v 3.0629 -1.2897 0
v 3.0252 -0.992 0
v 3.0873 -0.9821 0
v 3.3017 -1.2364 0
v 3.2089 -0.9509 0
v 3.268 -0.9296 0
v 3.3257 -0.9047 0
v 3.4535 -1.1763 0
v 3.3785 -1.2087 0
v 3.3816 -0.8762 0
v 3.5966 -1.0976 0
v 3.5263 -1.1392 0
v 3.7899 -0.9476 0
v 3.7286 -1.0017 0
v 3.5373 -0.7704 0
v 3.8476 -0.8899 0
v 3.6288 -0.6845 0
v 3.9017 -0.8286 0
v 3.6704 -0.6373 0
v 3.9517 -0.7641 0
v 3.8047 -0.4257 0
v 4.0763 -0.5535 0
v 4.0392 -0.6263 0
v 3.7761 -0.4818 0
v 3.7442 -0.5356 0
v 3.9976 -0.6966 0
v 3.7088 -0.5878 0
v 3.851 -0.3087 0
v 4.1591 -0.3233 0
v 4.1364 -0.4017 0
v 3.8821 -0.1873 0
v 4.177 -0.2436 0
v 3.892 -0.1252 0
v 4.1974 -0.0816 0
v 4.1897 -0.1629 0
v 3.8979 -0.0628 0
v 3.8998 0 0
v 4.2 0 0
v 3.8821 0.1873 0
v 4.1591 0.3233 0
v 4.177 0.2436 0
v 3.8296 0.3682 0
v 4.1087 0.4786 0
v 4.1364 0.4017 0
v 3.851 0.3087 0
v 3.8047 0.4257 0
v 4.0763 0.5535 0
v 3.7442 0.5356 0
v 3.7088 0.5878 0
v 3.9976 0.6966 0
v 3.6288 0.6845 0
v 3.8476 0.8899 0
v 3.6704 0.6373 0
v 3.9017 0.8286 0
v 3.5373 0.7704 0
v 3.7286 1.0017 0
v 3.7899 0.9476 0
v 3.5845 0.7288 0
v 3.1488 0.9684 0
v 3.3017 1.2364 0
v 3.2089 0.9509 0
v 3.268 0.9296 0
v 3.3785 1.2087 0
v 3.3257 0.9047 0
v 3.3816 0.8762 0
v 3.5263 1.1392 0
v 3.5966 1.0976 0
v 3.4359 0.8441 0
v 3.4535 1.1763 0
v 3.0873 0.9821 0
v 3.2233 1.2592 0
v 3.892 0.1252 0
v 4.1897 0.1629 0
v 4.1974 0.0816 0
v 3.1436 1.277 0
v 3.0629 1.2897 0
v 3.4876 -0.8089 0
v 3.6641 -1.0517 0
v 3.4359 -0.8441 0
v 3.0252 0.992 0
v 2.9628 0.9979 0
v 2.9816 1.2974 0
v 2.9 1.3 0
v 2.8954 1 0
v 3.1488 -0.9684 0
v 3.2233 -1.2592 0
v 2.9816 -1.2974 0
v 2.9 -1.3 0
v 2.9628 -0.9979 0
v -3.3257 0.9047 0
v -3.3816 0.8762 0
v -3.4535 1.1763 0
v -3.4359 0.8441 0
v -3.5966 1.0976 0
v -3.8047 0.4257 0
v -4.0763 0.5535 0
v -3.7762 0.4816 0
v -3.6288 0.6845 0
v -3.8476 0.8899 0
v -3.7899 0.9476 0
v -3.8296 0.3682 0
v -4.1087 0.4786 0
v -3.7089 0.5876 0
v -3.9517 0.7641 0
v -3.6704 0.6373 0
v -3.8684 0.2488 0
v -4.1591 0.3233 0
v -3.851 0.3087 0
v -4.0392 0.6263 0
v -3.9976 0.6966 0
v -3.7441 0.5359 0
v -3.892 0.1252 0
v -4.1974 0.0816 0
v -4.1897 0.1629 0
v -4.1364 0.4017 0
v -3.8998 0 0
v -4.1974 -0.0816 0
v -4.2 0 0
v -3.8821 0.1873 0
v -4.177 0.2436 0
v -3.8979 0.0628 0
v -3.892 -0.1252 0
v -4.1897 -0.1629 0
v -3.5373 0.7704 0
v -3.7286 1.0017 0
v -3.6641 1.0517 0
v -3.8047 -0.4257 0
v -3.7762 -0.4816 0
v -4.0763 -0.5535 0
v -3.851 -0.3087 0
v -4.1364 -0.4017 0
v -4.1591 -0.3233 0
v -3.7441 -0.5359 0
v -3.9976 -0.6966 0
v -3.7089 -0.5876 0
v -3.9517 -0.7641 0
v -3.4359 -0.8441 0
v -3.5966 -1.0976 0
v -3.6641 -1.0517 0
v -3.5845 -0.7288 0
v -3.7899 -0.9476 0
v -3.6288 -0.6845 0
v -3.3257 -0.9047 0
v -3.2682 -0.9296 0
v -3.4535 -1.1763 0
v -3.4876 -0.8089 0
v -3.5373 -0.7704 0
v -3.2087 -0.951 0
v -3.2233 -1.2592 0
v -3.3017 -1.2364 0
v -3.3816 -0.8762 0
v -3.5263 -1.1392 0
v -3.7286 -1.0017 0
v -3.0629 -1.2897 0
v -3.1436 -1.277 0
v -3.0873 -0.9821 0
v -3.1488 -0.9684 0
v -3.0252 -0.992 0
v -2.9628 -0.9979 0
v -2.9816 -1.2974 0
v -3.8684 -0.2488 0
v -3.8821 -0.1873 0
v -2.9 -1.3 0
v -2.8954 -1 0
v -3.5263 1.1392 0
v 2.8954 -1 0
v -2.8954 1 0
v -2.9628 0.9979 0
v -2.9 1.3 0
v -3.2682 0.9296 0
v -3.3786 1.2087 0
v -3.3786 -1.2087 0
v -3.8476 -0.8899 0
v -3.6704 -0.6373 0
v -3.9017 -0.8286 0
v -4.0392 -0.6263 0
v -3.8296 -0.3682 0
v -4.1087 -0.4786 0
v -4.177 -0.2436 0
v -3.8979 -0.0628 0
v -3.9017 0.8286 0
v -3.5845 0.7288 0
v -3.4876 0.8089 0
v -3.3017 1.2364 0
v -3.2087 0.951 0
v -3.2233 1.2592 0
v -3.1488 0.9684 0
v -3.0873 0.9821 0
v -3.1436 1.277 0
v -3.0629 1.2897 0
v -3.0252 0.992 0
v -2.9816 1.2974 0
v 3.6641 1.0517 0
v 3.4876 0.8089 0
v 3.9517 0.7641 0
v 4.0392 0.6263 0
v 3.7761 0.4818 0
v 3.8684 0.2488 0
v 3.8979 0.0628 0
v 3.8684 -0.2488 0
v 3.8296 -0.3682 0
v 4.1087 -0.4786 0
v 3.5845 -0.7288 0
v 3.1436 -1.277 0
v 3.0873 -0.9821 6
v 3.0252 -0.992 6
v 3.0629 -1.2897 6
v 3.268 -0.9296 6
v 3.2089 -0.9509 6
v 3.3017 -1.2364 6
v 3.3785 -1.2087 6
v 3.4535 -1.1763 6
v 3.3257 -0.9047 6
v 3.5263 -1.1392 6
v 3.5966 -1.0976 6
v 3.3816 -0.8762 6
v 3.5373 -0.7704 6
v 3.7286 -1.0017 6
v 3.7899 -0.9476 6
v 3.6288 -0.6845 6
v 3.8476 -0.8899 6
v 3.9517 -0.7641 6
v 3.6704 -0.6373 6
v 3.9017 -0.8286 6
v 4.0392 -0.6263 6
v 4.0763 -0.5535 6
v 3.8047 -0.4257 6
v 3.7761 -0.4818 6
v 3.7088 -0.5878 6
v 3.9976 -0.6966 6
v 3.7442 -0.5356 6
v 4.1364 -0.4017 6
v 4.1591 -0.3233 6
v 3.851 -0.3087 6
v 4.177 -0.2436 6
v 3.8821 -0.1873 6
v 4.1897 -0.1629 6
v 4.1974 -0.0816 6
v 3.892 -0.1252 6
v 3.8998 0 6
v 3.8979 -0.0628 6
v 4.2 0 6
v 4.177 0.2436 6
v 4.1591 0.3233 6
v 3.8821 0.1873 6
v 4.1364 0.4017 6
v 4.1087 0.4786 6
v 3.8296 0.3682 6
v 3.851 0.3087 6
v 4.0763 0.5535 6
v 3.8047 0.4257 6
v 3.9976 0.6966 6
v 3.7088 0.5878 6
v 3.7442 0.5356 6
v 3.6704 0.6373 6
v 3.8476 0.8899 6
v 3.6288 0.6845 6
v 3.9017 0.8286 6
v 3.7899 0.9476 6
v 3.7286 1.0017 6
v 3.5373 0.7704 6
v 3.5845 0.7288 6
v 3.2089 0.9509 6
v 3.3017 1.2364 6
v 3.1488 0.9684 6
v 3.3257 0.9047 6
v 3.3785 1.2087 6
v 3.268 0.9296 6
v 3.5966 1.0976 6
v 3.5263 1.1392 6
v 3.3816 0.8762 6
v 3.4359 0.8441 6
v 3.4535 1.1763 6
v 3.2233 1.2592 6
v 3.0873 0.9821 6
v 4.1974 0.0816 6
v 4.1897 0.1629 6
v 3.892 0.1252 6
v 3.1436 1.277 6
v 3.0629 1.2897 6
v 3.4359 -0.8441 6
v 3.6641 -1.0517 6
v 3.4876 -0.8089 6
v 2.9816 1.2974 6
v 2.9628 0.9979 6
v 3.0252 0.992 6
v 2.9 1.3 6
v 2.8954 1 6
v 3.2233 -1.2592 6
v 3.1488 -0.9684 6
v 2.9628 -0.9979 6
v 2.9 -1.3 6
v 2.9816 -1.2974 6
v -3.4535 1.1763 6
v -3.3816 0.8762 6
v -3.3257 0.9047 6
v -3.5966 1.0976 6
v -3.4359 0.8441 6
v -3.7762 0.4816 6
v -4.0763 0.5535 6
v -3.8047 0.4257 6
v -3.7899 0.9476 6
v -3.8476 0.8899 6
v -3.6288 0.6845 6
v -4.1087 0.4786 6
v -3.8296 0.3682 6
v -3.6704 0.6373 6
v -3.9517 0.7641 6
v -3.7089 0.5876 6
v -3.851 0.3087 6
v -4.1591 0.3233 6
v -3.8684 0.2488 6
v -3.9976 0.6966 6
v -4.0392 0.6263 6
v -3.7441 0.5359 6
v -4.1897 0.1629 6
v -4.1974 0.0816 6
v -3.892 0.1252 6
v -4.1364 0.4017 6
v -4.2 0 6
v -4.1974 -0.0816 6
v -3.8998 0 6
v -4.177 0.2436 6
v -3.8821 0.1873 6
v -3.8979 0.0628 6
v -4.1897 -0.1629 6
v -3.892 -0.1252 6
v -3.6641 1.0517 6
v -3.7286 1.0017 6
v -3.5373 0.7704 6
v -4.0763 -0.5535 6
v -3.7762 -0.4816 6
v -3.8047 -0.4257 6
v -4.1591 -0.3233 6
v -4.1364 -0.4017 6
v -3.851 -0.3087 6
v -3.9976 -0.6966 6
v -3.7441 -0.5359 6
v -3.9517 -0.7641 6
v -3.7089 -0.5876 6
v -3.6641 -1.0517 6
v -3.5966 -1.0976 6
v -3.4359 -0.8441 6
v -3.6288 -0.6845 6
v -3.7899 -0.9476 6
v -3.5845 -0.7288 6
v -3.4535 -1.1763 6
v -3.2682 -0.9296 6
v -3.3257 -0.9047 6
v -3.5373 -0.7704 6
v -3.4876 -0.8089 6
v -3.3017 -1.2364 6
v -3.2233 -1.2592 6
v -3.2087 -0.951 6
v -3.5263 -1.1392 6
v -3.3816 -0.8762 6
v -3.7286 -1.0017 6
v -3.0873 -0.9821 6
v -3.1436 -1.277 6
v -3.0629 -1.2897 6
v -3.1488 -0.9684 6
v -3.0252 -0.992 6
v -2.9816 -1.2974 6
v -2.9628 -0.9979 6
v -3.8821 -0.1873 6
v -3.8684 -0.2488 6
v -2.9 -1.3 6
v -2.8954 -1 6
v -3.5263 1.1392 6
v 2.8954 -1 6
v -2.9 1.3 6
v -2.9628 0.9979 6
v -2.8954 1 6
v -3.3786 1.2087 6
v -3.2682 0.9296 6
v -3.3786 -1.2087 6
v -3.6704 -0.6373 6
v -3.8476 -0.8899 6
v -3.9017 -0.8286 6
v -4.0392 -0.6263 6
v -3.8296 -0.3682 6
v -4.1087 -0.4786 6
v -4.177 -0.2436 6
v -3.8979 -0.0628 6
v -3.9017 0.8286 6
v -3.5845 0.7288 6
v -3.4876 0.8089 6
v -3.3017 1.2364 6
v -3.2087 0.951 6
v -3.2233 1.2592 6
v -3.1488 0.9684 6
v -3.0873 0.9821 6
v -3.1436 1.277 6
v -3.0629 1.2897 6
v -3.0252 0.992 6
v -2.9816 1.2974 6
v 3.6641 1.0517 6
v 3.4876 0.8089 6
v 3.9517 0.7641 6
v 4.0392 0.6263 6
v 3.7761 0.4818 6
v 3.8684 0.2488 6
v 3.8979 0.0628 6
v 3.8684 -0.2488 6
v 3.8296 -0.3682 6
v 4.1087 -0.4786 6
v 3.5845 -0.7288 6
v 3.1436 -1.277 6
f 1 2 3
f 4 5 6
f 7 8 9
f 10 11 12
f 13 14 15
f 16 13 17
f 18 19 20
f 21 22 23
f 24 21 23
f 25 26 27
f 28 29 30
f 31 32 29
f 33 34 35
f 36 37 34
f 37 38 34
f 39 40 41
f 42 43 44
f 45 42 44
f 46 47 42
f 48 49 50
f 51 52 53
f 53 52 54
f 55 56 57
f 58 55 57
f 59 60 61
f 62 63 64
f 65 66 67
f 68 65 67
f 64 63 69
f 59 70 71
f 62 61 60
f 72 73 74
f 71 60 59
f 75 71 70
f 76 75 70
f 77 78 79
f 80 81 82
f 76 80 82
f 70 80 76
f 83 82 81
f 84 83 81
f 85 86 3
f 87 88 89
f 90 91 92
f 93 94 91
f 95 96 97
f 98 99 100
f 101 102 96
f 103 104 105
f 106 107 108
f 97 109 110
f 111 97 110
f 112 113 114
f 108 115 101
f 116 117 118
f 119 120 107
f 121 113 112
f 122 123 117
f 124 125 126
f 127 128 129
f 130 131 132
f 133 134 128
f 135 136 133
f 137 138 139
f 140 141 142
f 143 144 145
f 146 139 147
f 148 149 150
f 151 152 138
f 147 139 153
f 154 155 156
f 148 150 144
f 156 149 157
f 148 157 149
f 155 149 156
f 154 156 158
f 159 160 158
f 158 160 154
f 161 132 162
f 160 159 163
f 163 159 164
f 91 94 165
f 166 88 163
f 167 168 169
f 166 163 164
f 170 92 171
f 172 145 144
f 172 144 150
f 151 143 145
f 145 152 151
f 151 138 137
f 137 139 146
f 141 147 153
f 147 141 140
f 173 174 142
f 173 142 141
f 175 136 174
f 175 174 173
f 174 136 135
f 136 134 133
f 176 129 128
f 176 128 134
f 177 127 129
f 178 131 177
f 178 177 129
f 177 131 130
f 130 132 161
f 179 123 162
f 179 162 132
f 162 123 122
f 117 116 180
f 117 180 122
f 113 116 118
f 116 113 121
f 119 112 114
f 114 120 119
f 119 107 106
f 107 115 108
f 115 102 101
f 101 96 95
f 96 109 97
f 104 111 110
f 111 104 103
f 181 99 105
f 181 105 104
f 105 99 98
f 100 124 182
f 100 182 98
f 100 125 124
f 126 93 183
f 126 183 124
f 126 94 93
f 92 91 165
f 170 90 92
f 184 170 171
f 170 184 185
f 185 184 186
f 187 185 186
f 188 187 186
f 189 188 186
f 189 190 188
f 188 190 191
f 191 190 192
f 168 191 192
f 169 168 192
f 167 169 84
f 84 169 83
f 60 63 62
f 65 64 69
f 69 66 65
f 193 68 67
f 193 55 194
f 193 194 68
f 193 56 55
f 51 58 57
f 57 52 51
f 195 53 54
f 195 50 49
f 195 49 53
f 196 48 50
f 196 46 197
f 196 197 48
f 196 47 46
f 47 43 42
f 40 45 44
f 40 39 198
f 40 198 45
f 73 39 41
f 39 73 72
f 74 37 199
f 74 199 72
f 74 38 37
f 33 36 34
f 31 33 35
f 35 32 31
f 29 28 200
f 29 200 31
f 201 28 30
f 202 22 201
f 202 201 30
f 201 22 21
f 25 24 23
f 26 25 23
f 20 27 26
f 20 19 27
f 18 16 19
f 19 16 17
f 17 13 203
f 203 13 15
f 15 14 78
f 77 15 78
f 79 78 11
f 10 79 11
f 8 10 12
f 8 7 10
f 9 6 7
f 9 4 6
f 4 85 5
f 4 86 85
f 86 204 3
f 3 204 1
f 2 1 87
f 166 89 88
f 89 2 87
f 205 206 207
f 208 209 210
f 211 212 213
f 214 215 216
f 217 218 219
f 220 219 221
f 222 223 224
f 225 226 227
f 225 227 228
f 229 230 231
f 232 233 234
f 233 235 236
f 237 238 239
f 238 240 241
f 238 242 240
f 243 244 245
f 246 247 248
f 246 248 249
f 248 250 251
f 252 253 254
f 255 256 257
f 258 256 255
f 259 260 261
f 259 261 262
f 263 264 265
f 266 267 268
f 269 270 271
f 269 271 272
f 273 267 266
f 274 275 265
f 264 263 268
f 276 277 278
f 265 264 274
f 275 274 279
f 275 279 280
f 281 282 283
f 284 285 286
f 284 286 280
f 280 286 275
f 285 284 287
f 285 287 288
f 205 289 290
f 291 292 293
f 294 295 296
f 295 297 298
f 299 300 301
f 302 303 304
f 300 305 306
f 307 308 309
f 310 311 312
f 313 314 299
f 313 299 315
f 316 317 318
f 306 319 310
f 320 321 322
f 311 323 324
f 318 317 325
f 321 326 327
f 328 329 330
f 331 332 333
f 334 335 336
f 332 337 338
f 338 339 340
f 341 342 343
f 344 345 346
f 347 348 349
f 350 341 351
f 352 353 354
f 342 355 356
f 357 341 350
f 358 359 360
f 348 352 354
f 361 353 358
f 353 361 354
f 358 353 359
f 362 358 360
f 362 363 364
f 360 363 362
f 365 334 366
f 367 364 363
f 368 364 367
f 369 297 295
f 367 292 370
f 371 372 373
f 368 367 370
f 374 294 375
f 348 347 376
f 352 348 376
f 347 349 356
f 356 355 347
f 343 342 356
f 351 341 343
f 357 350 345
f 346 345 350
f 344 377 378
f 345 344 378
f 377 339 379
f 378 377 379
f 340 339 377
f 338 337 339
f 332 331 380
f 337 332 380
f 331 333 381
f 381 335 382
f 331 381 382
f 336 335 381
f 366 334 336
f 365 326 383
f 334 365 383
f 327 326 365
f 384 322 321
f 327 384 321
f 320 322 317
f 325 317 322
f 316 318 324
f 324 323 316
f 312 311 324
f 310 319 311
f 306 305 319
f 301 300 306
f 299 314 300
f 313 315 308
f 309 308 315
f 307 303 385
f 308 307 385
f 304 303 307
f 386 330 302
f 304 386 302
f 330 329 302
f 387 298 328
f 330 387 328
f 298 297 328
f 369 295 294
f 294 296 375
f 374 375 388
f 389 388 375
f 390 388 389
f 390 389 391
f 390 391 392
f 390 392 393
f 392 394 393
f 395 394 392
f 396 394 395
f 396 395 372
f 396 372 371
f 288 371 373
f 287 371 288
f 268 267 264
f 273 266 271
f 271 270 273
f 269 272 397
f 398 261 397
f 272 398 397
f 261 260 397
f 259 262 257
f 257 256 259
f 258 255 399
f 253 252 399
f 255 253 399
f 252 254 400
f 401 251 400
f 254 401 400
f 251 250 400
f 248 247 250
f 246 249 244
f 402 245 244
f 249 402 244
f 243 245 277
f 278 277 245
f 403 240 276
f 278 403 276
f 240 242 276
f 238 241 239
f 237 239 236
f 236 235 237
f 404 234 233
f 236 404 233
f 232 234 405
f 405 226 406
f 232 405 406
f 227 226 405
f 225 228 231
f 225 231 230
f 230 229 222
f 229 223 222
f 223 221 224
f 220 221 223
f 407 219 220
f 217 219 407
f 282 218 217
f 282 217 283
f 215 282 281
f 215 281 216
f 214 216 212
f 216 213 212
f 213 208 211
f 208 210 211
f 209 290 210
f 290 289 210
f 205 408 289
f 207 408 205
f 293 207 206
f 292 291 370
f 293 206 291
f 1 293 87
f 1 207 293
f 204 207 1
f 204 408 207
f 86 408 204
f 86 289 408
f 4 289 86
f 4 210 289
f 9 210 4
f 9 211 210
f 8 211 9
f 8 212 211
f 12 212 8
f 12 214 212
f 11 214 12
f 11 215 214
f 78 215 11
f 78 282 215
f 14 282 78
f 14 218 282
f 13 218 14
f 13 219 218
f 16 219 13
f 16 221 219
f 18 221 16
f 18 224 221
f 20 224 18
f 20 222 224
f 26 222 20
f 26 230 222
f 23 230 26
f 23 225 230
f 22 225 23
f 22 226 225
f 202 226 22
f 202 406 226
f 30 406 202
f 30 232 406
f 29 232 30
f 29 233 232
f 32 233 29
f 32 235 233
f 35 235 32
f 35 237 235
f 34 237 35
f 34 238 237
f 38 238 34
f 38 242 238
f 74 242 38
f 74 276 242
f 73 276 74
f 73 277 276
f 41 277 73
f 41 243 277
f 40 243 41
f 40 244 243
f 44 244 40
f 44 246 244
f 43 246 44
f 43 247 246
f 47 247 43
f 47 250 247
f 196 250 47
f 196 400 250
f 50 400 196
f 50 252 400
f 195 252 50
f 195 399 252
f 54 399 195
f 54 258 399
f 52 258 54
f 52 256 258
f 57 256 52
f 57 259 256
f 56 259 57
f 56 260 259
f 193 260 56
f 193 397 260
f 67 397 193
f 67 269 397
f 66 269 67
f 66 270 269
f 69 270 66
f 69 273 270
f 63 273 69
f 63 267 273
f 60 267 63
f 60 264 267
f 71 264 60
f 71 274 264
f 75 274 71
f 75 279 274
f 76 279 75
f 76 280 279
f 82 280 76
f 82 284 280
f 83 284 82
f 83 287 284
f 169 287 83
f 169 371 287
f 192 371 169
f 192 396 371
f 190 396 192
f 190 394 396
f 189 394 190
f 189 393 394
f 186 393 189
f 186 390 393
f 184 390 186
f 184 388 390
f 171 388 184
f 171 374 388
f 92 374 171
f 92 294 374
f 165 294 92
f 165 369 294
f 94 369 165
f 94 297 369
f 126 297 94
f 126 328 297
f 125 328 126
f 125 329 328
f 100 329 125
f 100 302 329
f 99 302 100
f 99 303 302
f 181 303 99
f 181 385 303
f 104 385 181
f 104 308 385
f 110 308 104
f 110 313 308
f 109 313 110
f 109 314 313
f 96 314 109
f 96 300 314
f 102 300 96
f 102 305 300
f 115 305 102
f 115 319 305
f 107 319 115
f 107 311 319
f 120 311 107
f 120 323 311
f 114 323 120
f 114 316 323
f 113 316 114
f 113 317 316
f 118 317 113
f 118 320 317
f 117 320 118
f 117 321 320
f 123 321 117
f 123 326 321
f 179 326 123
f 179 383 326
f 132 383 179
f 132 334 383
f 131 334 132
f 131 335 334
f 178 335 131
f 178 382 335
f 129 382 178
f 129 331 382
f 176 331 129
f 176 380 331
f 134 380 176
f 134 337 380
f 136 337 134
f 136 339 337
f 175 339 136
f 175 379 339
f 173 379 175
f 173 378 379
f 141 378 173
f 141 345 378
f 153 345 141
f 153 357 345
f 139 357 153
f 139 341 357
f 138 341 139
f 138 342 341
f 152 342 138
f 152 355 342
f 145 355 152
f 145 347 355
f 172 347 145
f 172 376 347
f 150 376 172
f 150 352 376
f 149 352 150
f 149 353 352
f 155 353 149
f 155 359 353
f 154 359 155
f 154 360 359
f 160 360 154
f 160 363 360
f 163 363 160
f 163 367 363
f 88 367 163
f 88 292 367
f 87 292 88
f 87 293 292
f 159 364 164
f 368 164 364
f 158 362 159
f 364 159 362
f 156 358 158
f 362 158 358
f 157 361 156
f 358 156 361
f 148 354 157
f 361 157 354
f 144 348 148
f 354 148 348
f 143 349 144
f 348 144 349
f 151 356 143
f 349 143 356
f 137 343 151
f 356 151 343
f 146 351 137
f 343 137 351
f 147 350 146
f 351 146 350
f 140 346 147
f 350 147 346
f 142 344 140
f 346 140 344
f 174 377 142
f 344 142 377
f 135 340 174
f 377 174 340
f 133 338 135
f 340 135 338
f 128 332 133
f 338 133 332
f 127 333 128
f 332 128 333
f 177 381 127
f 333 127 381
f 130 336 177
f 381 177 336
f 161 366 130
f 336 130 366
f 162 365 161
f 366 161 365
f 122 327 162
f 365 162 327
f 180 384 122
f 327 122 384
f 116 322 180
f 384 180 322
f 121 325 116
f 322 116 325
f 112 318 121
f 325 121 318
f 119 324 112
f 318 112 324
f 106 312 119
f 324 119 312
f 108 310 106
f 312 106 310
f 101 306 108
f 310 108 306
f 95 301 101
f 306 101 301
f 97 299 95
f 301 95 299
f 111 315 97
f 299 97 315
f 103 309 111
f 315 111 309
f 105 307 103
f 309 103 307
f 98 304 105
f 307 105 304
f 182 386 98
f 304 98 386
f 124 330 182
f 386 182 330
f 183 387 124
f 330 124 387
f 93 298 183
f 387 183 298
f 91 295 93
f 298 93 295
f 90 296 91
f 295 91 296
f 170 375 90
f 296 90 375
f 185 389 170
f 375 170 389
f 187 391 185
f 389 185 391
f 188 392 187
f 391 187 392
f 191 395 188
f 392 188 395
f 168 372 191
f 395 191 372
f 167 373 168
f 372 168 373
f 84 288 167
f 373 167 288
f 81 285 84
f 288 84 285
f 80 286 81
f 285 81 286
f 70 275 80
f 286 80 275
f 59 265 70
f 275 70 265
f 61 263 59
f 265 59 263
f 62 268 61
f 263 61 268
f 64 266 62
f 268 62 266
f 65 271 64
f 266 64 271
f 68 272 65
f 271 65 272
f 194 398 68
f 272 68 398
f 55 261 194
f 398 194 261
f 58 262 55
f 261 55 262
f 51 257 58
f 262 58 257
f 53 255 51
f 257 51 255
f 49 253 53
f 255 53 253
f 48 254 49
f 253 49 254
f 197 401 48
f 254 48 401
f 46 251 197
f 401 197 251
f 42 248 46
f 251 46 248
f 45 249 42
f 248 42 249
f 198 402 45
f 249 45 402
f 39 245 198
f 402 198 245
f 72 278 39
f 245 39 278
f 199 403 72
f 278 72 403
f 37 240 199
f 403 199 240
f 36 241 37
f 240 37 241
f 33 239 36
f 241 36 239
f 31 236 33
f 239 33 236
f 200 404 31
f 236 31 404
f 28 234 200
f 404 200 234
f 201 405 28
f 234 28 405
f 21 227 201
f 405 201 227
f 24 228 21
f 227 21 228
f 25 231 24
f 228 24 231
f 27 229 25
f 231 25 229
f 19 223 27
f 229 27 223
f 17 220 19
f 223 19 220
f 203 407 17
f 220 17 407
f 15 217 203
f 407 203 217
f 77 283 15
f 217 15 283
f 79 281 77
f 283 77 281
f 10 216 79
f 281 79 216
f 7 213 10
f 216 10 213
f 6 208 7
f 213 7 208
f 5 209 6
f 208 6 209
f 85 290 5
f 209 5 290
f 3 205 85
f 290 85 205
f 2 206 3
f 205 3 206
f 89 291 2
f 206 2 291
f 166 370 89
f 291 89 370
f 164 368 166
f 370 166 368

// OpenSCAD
$fn = 100;

sheath_outer_width = 2.6;
sheath_outer_length = 8.4;

module typec_sheath_outer() {
  module end_cylinder() {
    circle(sheath_outer_width / 2);
  }

  translate([-(sheath_outer_length - sheath_outer_width) / 2, 0, 0])
  union() {
    end_cylinder();
    translate([0, - (sheath_outer_width / 2), 0])
      square([sheath_outer_length - sheath_outer_width, sheath_outer_width]);
    translate([sheath_outer_length - sheath_outer_width, 0, 0])
    end_cylinder();
  }
}

module typec_sheath_inner() {
  offset(r=-0.3) typec_sheath_outer();
}

module typec_male(length=6) {
  linear_extrude(length)
  difference() {
    typec_sheath_outer();
    typec_sheath_inner();
  }
}

typec_male();
